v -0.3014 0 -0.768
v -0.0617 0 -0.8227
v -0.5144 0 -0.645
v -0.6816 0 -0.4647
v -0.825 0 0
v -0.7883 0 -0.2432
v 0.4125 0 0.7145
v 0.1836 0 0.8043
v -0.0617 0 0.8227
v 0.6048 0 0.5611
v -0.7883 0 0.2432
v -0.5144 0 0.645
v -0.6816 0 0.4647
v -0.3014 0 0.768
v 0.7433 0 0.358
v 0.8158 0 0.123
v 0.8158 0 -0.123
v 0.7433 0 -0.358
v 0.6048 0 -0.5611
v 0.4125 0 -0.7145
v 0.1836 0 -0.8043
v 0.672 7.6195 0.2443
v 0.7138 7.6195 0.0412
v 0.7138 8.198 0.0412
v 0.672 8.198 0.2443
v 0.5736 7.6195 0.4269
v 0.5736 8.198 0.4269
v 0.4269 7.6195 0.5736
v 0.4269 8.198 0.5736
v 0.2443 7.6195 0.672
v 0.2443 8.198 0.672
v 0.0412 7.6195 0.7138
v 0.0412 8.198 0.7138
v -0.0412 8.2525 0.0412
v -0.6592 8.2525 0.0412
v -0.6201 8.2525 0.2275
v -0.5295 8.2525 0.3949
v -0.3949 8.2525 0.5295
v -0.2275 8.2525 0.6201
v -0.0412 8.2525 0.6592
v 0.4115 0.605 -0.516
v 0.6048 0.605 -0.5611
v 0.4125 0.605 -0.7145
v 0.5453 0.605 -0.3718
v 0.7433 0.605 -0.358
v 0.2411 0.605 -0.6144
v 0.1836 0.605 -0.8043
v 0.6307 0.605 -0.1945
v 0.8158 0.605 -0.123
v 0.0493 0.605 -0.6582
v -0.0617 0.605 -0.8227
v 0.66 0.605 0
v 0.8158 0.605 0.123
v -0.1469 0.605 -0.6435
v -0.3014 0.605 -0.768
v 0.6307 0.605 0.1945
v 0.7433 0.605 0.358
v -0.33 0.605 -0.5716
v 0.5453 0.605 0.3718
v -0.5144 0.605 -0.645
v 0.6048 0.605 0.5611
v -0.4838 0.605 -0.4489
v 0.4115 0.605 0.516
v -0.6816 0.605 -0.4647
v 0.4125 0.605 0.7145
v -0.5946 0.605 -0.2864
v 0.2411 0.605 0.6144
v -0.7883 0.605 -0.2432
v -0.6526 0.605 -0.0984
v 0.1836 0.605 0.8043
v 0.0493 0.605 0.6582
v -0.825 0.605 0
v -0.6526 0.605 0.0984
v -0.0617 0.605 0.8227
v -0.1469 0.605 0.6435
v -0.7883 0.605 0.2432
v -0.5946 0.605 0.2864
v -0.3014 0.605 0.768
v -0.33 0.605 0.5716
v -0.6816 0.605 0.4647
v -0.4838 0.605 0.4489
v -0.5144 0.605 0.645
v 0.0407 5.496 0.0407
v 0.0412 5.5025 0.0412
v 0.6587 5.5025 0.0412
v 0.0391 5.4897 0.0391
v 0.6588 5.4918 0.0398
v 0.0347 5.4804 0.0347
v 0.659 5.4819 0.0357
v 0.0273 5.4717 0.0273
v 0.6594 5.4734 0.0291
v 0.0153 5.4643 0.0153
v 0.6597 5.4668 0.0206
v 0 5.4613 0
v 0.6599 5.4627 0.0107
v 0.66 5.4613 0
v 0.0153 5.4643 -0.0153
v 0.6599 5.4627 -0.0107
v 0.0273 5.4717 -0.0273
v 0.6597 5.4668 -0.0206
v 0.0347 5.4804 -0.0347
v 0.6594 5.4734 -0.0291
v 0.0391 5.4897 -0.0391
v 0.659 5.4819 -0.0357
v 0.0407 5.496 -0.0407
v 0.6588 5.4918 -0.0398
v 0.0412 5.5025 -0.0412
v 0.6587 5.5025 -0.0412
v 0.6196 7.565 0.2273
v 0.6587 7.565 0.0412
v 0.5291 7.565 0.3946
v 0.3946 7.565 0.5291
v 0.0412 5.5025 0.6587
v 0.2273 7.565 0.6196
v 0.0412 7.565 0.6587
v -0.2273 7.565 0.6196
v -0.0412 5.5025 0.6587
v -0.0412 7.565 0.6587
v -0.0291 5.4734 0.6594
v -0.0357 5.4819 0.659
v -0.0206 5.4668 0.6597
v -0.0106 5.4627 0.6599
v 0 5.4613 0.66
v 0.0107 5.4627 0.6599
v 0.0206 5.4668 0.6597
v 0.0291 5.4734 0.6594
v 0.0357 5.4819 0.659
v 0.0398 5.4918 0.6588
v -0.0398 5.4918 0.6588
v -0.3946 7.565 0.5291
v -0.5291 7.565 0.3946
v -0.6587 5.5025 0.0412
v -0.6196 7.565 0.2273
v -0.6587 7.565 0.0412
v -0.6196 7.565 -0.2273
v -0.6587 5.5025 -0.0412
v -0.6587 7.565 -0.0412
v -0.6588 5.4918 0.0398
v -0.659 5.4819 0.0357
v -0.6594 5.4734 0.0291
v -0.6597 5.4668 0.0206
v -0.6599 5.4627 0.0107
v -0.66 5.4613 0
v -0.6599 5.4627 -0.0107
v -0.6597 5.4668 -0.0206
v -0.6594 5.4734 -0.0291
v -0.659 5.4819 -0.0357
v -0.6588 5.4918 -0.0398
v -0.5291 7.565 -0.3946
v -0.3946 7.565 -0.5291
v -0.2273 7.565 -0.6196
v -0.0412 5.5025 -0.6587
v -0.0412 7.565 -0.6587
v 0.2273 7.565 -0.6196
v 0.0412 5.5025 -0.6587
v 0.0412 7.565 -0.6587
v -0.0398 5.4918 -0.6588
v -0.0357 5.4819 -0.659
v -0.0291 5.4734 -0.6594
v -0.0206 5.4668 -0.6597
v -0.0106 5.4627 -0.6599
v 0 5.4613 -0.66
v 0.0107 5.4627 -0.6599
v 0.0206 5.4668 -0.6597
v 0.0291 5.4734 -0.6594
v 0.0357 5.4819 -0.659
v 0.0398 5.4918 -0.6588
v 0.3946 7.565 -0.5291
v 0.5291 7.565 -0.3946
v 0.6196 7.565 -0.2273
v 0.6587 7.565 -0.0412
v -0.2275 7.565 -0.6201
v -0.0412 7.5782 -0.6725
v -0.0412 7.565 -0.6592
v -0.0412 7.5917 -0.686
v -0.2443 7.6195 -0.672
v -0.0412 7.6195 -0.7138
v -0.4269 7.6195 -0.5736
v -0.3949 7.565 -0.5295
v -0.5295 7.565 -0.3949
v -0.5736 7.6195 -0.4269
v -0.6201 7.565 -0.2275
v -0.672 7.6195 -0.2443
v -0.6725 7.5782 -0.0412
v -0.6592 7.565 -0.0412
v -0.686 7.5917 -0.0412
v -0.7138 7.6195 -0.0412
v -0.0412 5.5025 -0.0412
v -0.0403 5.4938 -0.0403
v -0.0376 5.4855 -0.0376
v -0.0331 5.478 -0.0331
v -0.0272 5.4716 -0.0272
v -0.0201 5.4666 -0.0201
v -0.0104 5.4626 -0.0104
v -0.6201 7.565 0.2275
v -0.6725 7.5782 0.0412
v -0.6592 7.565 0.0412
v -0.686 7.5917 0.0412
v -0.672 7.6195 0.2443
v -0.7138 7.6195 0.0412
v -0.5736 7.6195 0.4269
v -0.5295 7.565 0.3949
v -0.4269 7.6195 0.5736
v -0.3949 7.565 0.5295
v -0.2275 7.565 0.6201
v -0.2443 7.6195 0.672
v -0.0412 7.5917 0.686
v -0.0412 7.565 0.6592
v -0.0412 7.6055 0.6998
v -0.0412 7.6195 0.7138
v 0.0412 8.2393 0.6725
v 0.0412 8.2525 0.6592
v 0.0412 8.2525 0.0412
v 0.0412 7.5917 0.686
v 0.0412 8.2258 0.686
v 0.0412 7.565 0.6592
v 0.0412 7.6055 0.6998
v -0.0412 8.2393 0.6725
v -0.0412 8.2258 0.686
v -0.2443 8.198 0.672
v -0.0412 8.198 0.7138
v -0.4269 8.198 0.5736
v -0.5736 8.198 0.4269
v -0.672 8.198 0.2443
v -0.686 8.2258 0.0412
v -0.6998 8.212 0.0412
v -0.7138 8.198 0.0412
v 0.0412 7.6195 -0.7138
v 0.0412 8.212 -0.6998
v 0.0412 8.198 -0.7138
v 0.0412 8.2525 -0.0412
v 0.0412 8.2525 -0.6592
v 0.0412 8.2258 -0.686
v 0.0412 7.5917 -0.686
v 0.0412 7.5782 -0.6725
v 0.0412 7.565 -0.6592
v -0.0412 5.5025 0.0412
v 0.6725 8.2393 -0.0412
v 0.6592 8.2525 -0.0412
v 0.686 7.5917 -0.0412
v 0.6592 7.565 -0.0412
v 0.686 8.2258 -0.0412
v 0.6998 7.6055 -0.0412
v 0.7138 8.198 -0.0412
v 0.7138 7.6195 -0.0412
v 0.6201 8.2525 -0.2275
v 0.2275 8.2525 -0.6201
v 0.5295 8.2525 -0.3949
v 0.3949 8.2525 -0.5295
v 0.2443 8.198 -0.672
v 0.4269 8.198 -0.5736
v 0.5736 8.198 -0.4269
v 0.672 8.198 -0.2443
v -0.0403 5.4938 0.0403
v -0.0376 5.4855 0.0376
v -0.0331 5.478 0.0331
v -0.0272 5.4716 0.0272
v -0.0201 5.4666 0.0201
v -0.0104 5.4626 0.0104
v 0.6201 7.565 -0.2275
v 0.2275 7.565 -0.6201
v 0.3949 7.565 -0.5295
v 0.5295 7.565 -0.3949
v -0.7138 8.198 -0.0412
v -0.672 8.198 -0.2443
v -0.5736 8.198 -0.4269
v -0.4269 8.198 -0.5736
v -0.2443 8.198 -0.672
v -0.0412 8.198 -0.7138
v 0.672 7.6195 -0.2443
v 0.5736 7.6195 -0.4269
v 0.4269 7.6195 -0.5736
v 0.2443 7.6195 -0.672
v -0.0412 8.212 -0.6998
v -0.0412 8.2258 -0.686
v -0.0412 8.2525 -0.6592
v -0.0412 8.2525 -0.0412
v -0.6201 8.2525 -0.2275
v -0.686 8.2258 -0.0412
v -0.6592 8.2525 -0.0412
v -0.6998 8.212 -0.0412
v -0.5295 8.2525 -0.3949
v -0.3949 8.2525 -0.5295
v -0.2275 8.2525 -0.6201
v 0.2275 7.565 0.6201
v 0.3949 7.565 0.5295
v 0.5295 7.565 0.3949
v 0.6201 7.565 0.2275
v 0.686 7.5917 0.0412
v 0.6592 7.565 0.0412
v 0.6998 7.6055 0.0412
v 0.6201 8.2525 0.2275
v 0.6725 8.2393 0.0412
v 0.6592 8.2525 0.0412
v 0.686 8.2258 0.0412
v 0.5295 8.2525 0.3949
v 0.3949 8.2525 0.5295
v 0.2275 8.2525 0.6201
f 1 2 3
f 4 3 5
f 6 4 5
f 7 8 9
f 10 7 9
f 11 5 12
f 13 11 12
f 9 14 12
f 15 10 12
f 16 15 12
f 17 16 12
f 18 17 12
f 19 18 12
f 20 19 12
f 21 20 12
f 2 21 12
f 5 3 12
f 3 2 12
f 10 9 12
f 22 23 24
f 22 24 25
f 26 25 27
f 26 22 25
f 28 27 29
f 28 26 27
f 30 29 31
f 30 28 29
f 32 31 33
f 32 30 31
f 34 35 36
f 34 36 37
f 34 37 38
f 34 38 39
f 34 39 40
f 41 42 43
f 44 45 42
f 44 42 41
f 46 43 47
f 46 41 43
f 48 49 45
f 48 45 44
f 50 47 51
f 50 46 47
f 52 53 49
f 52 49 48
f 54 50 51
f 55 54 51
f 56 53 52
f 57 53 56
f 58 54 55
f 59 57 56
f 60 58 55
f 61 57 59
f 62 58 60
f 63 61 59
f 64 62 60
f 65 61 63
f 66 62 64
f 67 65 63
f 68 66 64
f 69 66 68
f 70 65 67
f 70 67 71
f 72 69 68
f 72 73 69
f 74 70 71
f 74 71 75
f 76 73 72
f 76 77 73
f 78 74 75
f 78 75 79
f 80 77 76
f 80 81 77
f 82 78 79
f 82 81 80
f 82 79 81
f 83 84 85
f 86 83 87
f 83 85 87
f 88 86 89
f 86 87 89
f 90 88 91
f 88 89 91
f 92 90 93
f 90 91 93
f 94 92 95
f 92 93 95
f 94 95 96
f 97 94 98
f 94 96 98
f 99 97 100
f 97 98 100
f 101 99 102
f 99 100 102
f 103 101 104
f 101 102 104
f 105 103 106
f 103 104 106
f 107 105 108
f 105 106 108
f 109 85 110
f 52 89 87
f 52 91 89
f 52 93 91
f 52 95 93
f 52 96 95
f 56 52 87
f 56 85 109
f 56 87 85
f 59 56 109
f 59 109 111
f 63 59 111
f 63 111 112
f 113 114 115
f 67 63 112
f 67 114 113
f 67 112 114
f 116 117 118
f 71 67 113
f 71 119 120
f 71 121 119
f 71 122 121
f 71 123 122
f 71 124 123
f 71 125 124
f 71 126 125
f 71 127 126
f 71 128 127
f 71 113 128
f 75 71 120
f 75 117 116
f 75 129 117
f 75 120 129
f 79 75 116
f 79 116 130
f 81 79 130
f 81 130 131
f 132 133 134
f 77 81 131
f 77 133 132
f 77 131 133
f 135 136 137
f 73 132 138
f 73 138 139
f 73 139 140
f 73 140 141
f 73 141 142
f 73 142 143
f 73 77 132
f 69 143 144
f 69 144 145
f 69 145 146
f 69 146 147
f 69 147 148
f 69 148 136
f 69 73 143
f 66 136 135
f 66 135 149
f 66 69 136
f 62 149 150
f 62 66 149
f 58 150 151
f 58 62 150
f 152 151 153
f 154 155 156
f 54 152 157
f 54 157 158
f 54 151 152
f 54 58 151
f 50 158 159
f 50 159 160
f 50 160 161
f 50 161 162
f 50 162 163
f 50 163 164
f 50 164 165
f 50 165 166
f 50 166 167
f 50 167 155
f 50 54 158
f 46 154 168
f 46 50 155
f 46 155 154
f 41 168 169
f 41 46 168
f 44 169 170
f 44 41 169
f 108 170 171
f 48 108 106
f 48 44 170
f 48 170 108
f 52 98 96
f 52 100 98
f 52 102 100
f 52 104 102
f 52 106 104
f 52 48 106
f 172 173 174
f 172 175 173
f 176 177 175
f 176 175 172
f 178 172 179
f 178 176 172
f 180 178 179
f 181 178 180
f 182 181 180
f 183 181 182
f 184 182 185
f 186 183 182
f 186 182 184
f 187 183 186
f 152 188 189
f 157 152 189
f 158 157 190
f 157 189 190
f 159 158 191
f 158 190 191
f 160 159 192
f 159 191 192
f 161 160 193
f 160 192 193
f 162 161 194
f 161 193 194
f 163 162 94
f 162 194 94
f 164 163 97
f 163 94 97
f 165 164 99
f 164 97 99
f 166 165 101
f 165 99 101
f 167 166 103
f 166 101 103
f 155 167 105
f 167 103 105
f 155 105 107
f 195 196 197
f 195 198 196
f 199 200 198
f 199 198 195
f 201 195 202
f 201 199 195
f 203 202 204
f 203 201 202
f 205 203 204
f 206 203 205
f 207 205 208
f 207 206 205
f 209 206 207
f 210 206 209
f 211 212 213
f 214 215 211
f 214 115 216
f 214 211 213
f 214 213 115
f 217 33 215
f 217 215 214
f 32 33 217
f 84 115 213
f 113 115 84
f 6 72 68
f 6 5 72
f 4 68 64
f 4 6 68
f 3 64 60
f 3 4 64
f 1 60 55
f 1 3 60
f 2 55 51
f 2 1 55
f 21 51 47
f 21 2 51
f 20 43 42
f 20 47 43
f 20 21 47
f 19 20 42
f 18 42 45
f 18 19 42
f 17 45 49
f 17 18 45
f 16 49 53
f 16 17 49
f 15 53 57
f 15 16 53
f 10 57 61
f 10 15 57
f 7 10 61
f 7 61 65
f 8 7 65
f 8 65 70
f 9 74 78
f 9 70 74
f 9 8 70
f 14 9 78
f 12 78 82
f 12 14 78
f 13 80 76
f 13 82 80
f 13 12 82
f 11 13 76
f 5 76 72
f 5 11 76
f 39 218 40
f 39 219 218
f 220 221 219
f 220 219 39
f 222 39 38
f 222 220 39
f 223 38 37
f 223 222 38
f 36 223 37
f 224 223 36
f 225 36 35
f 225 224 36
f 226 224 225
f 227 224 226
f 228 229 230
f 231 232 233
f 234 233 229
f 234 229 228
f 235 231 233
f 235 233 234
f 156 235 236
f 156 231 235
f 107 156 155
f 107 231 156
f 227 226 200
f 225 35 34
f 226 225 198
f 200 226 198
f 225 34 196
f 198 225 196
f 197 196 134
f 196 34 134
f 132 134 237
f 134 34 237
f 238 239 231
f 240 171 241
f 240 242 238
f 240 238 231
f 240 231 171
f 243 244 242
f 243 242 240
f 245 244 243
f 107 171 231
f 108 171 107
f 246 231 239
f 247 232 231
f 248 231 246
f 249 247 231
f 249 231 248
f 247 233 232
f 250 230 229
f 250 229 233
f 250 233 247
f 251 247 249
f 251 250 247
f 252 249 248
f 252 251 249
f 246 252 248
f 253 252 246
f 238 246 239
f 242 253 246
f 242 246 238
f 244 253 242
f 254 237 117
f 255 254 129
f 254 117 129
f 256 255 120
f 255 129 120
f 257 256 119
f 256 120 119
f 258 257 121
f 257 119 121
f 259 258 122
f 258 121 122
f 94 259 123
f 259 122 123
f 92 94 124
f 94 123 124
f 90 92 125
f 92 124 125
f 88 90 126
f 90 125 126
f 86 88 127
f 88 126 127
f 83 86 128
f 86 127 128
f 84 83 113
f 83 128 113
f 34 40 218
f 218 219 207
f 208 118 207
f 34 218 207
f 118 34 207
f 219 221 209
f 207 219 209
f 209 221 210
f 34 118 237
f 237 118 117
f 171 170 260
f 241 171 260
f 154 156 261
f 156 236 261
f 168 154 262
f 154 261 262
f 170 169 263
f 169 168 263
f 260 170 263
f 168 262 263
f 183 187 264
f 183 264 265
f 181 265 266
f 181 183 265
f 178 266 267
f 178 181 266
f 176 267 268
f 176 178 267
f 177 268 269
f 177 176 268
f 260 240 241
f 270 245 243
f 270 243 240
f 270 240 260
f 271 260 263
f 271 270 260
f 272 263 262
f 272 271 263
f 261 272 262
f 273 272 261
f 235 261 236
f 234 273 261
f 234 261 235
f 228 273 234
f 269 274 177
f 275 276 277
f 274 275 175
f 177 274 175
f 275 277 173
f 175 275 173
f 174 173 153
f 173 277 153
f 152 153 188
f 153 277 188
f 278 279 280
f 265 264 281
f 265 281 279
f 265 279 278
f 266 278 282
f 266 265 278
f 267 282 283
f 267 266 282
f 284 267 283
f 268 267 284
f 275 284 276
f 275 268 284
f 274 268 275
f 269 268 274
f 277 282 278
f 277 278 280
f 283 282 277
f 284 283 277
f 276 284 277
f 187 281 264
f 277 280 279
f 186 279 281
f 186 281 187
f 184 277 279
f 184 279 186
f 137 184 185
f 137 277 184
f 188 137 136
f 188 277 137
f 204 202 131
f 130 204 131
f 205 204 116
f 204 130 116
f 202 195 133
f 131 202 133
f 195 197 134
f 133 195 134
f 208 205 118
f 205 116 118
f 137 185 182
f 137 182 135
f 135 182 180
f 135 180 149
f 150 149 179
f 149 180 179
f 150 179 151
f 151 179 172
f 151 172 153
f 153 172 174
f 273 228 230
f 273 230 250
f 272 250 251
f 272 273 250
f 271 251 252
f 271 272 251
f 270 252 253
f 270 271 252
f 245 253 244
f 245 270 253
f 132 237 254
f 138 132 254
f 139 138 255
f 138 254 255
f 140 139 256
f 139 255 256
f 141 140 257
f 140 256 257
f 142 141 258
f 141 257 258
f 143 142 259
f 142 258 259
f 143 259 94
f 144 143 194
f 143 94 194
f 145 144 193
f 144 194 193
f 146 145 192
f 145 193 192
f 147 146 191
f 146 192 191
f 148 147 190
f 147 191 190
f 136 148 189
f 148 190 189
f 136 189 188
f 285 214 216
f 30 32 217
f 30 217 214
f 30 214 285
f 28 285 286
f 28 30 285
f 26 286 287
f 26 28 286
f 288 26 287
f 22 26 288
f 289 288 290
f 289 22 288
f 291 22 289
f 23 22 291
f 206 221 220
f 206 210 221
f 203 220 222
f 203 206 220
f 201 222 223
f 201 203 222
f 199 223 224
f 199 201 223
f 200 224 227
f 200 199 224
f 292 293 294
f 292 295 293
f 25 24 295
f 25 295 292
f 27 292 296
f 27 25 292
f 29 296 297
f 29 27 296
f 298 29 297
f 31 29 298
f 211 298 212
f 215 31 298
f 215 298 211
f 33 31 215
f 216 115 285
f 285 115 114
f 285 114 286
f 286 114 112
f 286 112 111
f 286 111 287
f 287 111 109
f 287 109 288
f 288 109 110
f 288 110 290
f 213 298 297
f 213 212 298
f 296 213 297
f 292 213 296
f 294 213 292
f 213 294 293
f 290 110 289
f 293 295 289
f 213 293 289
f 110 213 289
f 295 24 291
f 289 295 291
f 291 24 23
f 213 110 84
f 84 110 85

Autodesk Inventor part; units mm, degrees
ref_plane "YZ Plane" through (0, 0, 0) normal (1, 0, 0) x (0, 1, 0)
ref_plane "XZ Plane" through (0, 0, 0) normal (0, 1, 0) x (-1, 0, 0)
ref_plane "XY Plane" through (0, 0, 0) normal (0, 0, 1) x (1, 0, 0)
sketch "Sketch1" plane through (0, 0, 0) normal (0, 1, 0) x (-1, 0, 0)
  circle A0 centre (0, 0) radius 0.825
  dimension "d0" = 1.65
extrude "Extrusion1" add sketch "Sketch1" along normal blind 0.605
sketch "Sketch2" plane through (0, 0.605, 0) normal (0, 1, 0) x (1, 0, 0)
  circle A0 centre (0, 0) radius 0.825 projected
  circle A1 centre (0, 0) radius 0.66
  dimension "d3" = 1.32
extrude "Extrusion2" add sketch "Sketch2" along normal blind 6.96 contours A1
sketch "Sketch3" plane through (0, 7.565, 0) normal (0, 1, 0) x (1, 0, 0)
  circle A0 centre (0, 0) radius 0.715
  dimension "d6" = 1.43
extrude "Extrusion3" add sketch "Sketch3" along normal blind 0.6875
chamfer "Chamfer1" distance 0.055 angle 45 2 edges at (-0.715, 8.2525, 0) (-0.715, 7.565, 0)
sketch "Sketch4" plane through (0, 0, 0) normal (0, 0, 1) x (1, 0, 0)
  line L0 (-0.66, 8.2525) -> (0.66, 8.2525) projected
  line L1 (0, 8.2525) -> (0.0412, 8.2525)
  line L2 (0.0412, 8.2525) -> (0.0412, 5.5025)
  line L3 (0.0412, 5.5025) -> (0, 5.5025)
  circle A0 centre (0, 5.5025) radius 0.0412
  line L4 (0, 5.5025) -> (0, 5.524)
  line L5 (-0.0412, 8.2525) -> (-0.0412, 5.5025)
  line L6 (-0.0412, 8.2525) -> (0, 8.2525)
  point P0 (0, 0)
  dimension "d12" = 0.0413
  dimension "d13" = 2.75
extrude "Extrusion4" cut sketch "Sketch4" against normal mid plane 2.1875
pattern_circular "Circular Pattern1" count 4 over 360 about axis through (0, 0.605, 0) along (0, 1, 0) of "Extrusion4"
properties part number "Pin_Dedao"
